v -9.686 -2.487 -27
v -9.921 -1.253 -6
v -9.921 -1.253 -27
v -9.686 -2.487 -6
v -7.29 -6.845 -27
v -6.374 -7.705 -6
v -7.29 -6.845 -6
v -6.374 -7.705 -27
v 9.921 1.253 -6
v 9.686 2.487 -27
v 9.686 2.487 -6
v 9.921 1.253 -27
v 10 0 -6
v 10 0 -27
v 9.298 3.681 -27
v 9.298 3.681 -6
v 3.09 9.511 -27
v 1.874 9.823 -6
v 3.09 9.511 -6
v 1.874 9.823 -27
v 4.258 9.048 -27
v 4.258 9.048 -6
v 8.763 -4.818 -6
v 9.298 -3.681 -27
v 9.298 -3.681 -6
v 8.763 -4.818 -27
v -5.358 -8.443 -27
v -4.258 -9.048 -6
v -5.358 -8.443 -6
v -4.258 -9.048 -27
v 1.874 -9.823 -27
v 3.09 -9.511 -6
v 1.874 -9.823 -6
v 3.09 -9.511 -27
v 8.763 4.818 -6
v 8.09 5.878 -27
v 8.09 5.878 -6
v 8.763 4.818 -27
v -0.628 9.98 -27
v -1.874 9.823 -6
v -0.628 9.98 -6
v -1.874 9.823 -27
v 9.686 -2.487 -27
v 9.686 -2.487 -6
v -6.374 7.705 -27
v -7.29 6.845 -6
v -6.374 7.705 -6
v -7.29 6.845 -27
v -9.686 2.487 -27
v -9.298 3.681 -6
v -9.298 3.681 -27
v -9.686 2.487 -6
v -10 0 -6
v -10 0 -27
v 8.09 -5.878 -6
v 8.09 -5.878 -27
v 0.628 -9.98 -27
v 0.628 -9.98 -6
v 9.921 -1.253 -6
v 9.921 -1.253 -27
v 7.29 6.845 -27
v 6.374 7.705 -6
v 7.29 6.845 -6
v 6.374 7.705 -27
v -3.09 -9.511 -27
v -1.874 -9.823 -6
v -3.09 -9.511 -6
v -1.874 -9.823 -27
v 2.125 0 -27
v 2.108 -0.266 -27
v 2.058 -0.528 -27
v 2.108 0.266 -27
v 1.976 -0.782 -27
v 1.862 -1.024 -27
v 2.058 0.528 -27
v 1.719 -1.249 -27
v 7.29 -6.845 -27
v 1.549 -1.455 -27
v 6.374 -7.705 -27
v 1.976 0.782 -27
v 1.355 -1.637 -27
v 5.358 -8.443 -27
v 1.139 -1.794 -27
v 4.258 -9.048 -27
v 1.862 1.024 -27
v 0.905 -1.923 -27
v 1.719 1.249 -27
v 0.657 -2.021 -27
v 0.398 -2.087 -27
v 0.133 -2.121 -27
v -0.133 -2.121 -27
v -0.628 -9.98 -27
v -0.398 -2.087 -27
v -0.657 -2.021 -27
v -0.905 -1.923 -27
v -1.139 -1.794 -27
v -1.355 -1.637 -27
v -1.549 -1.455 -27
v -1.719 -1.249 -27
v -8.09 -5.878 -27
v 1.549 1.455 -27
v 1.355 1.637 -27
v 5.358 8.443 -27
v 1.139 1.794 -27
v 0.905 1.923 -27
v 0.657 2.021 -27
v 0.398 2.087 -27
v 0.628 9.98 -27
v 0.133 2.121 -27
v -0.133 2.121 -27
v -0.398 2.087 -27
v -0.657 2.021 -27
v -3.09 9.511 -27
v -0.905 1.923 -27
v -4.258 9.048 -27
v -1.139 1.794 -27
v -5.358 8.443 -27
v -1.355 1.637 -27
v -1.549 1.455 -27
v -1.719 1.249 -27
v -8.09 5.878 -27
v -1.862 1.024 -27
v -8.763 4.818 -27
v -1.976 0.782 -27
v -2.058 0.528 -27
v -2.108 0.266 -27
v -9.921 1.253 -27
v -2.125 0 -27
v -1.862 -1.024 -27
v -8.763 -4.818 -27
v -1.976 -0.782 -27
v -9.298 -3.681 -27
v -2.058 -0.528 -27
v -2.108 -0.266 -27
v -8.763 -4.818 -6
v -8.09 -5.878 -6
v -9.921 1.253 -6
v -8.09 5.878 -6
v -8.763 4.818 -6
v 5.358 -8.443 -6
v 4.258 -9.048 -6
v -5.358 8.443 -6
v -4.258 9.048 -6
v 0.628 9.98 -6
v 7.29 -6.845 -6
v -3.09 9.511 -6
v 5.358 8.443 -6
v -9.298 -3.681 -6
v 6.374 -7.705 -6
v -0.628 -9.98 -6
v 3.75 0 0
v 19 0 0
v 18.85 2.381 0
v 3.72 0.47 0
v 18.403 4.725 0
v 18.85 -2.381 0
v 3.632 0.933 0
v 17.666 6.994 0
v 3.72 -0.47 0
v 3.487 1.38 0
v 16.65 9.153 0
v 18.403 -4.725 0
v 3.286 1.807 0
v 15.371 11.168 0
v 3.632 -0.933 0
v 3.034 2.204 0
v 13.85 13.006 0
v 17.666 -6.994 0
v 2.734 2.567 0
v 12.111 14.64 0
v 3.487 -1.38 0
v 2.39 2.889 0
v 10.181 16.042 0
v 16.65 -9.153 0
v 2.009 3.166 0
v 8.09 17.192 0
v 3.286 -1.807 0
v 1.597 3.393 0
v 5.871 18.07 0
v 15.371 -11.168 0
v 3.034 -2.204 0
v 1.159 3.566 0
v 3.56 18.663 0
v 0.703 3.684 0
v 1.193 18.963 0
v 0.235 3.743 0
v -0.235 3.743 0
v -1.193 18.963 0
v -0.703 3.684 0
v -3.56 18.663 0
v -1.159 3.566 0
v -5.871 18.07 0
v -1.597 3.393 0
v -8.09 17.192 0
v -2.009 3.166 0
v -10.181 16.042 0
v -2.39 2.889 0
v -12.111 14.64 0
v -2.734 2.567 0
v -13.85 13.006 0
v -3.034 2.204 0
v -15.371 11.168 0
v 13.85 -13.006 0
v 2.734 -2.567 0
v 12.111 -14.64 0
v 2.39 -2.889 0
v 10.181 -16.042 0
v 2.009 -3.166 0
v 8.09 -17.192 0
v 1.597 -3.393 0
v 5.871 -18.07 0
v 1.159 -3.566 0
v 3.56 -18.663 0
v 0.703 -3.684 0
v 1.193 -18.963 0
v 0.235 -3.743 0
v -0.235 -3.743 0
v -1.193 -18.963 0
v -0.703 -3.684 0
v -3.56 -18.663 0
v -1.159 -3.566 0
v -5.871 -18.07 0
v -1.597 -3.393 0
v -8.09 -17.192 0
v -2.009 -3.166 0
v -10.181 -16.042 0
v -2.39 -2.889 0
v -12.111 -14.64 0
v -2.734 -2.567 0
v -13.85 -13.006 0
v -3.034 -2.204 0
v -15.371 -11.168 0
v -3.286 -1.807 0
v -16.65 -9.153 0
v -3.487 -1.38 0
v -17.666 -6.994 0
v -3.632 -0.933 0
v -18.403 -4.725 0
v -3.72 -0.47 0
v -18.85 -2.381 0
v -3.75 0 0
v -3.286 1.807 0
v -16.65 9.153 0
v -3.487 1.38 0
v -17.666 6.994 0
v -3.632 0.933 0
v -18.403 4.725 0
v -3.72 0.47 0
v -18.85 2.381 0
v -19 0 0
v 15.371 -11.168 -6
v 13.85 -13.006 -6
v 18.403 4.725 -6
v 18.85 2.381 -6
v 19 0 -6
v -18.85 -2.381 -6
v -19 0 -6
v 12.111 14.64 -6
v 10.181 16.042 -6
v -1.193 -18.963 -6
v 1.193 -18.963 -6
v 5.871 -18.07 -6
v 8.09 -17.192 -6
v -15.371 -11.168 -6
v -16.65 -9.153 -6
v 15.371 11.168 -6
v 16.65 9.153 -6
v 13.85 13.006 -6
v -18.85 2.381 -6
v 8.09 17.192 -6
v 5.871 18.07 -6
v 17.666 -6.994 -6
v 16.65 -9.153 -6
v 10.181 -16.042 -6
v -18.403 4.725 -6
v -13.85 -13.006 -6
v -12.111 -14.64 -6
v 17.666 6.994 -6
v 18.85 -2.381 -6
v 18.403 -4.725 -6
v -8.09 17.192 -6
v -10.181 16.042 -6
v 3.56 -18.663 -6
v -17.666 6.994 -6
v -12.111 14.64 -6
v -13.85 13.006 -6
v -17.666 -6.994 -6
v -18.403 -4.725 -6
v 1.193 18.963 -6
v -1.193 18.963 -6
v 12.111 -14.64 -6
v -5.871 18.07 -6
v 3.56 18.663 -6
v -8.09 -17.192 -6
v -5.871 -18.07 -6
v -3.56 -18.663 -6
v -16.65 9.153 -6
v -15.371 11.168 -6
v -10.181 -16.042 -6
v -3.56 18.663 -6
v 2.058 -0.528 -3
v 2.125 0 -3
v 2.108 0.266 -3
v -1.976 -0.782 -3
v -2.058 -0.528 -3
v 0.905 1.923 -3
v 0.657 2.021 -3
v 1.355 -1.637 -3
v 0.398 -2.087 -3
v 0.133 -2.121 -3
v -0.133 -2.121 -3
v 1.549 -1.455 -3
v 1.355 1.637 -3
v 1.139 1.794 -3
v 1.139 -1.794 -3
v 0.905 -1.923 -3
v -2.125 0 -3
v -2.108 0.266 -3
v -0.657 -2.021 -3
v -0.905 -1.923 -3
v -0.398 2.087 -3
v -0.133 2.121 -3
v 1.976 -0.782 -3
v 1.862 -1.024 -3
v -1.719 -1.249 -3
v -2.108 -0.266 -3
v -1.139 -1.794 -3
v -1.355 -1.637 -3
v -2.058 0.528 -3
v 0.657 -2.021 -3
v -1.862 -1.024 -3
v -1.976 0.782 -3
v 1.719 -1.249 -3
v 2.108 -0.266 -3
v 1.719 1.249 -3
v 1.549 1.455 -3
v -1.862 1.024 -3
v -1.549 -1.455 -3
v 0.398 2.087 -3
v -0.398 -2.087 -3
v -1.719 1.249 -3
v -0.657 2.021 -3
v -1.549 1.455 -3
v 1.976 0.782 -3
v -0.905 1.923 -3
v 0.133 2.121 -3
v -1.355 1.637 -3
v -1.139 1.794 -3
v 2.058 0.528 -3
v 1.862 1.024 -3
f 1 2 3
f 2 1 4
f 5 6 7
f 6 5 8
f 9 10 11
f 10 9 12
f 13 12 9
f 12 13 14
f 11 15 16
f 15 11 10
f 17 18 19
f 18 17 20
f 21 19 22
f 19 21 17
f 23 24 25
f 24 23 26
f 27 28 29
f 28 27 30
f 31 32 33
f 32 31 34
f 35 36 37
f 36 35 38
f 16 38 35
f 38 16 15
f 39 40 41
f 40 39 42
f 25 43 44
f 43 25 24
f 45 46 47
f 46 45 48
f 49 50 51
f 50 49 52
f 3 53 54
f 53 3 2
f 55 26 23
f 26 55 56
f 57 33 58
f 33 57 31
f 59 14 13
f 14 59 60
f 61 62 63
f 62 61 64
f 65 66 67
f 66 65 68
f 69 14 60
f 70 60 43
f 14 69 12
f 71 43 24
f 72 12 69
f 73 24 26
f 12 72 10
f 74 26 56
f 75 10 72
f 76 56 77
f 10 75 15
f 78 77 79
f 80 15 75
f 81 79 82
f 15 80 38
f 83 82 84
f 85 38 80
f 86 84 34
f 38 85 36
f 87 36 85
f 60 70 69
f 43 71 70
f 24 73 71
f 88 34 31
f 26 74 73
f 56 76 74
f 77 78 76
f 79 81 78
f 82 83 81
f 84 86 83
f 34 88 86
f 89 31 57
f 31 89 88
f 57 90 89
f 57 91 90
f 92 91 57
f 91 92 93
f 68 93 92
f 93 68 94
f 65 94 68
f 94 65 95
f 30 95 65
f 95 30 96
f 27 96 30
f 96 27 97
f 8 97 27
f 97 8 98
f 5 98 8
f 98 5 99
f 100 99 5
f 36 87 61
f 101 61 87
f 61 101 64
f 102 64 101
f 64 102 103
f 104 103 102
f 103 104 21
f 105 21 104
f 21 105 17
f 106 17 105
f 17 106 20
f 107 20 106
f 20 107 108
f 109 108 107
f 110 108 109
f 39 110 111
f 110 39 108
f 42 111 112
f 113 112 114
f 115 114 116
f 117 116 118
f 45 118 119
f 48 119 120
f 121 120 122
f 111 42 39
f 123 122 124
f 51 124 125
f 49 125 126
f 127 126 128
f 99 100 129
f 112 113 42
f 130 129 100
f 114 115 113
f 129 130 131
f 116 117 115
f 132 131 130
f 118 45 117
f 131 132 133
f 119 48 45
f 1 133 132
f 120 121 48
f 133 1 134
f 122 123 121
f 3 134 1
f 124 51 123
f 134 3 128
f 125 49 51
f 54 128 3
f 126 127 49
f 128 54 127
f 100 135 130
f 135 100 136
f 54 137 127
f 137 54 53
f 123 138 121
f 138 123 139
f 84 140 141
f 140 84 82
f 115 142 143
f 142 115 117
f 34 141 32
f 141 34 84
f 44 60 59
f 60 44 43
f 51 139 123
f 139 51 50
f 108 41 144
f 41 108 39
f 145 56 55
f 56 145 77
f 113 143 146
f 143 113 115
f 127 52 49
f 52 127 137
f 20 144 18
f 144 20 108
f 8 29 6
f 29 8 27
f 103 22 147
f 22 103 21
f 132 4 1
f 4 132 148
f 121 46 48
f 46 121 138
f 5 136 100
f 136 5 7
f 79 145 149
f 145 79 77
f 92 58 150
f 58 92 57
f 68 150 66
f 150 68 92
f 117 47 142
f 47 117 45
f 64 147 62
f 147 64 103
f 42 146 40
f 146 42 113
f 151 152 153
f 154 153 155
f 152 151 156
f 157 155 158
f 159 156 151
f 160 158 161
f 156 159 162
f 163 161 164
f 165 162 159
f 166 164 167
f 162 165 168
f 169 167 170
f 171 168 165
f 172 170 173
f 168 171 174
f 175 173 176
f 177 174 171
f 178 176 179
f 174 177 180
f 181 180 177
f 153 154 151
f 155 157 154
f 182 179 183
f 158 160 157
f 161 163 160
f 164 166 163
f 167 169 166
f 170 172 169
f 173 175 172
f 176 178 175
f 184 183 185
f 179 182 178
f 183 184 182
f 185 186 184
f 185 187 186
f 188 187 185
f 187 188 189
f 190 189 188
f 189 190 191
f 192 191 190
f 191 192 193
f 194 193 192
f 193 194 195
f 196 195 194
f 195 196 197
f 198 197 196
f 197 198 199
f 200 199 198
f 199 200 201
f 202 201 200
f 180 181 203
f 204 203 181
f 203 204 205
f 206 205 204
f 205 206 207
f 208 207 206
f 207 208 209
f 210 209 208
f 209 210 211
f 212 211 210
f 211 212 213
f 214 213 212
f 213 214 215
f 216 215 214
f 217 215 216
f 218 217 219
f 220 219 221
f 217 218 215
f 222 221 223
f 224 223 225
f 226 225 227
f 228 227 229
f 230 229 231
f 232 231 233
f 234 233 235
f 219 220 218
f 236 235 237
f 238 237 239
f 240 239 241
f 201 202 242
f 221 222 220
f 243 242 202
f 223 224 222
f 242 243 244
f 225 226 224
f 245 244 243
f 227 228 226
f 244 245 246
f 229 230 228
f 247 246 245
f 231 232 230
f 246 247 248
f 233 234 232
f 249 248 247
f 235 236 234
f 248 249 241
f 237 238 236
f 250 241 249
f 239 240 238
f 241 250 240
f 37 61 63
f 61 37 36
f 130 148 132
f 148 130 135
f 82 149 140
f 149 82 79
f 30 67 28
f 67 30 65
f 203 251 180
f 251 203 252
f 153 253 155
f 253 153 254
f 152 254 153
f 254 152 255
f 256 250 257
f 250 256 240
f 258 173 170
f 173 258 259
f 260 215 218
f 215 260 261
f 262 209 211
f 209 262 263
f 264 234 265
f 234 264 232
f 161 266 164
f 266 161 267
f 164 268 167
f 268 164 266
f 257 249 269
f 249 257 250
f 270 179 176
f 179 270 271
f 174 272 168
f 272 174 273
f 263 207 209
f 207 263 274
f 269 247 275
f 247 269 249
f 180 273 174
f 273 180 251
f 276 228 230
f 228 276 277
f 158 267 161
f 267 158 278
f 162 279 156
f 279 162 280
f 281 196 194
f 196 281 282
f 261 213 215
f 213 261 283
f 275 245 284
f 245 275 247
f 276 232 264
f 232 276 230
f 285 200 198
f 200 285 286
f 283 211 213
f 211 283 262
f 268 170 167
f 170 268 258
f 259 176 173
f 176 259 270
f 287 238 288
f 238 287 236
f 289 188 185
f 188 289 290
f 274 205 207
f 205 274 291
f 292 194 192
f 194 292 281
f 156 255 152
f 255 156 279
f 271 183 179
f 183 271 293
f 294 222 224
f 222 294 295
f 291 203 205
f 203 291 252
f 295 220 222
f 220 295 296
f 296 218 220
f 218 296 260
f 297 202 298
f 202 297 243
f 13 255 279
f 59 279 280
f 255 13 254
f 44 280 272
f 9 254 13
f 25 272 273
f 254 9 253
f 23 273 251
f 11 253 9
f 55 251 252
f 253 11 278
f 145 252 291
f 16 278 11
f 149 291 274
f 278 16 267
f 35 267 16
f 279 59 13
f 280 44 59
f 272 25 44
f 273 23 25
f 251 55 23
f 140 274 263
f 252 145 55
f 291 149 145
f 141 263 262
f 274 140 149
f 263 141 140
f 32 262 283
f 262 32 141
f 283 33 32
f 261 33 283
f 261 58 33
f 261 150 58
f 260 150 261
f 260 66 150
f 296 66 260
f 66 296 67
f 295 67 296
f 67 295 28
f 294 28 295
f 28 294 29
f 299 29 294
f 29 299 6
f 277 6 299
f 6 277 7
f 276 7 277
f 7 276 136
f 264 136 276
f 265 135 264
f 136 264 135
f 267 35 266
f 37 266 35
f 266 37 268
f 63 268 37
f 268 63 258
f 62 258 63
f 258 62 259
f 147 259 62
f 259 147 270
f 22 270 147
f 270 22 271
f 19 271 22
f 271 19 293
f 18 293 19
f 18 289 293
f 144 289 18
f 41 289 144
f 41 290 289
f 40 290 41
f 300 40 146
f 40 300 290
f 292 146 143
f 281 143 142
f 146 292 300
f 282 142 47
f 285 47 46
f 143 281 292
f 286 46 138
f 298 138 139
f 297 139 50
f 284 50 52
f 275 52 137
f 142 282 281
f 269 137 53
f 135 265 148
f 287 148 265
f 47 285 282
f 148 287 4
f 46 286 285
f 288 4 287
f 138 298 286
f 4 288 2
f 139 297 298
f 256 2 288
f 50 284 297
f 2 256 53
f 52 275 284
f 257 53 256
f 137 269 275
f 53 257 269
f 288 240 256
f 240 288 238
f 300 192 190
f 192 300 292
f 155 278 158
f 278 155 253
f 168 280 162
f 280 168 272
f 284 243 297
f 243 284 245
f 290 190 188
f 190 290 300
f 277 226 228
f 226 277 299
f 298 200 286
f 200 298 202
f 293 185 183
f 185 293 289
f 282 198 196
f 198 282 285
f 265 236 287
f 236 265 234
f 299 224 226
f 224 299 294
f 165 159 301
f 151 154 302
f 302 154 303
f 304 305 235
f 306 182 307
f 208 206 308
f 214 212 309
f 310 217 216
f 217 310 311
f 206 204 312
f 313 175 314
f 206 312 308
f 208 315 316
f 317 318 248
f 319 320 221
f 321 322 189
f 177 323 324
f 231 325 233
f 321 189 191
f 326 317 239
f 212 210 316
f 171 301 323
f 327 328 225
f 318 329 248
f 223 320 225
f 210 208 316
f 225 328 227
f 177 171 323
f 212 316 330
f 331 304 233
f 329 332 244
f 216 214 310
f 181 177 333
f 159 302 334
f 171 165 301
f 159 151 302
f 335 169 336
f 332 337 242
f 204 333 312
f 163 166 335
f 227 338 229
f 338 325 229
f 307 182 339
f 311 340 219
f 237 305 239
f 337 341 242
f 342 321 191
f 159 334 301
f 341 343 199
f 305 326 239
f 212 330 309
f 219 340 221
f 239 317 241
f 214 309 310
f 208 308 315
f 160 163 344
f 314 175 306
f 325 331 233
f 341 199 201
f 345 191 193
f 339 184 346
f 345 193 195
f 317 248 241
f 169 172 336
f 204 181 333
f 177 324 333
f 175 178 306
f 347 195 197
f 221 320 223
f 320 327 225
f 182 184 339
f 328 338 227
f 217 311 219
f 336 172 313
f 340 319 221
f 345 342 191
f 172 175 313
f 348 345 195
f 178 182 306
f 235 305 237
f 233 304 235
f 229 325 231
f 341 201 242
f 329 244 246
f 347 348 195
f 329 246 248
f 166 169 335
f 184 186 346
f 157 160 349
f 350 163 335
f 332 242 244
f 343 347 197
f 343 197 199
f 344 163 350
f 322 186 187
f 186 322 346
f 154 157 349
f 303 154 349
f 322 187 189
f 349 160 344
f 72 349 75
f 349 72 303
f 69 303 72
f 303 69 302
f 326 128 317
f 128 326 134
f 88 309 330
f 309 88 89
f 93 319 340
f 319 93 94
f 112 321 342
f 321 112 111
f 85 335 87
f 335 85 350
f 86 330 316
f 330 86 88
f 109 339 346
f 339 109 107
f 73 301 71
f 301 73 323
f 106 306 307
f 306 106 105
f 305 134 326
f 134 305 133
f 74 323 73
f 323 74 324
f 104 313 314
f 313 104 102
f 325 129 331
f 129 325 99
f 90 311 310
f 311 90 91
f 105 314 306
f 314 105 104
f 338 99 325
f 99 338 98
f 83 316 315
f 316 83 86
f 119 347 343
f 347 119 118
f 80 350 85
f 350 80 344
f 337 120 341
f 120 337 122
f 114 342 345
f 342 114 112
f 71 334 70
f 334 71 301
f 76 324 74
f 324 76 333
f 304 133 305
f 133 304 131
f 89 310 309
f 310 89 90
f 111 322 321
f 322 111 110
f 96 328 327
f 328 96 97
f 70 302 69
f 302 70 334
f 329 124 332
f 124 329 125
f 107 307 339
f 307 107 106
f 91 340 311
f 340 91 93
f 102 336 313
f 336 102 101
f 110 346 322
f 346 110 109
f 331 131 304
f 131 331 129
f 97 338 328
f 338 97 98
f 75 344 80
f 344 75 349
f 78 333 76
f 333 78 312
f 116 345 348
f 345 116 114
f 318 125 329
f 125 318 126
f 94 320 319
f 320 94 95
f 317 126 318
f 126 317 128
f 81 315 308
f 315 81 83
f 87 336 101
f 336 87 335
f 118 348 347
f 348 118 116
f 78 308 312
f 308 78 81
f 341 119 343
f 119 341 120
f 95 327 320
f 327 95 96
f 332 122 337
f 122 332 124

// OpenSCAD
$fn = 50;


difference() {
	union() {
		translate(v = [0, 0, -27.0000000000]) {
			cylinder(h = 27, r = 10.0000000000);
		}
		translate(v = [0, 0, -6.0000000000]) {
			cylinder(h = 6, r = 19.0000000000);
		}
	}
	union() {
		translate(v = [0, 0, 0]) {
			rotate(a = [0, 0, 0]) {
				difference() {
					union() {
						#translate(v = [0, 0, -27.0000000000]) {
							cylinder(h = 27, r = 2.0000000000);
						}
						#translate(v = [0, 0, -3]) {
							cylinder(h = 3, r1 = 2.1250000000, r2 = 3.7500000000);
						}
						#translate(v = [0, 0, -27.0000000000]) {
							cylinder(h = 27, r = 2.1250000000);
						}
						#translate(v = [0, 0, -27.0000000000]) {
							cylinder(h = 27, r = 2.0000000000);
						}
					}
					union();
				}
			}
		}
	}
}
